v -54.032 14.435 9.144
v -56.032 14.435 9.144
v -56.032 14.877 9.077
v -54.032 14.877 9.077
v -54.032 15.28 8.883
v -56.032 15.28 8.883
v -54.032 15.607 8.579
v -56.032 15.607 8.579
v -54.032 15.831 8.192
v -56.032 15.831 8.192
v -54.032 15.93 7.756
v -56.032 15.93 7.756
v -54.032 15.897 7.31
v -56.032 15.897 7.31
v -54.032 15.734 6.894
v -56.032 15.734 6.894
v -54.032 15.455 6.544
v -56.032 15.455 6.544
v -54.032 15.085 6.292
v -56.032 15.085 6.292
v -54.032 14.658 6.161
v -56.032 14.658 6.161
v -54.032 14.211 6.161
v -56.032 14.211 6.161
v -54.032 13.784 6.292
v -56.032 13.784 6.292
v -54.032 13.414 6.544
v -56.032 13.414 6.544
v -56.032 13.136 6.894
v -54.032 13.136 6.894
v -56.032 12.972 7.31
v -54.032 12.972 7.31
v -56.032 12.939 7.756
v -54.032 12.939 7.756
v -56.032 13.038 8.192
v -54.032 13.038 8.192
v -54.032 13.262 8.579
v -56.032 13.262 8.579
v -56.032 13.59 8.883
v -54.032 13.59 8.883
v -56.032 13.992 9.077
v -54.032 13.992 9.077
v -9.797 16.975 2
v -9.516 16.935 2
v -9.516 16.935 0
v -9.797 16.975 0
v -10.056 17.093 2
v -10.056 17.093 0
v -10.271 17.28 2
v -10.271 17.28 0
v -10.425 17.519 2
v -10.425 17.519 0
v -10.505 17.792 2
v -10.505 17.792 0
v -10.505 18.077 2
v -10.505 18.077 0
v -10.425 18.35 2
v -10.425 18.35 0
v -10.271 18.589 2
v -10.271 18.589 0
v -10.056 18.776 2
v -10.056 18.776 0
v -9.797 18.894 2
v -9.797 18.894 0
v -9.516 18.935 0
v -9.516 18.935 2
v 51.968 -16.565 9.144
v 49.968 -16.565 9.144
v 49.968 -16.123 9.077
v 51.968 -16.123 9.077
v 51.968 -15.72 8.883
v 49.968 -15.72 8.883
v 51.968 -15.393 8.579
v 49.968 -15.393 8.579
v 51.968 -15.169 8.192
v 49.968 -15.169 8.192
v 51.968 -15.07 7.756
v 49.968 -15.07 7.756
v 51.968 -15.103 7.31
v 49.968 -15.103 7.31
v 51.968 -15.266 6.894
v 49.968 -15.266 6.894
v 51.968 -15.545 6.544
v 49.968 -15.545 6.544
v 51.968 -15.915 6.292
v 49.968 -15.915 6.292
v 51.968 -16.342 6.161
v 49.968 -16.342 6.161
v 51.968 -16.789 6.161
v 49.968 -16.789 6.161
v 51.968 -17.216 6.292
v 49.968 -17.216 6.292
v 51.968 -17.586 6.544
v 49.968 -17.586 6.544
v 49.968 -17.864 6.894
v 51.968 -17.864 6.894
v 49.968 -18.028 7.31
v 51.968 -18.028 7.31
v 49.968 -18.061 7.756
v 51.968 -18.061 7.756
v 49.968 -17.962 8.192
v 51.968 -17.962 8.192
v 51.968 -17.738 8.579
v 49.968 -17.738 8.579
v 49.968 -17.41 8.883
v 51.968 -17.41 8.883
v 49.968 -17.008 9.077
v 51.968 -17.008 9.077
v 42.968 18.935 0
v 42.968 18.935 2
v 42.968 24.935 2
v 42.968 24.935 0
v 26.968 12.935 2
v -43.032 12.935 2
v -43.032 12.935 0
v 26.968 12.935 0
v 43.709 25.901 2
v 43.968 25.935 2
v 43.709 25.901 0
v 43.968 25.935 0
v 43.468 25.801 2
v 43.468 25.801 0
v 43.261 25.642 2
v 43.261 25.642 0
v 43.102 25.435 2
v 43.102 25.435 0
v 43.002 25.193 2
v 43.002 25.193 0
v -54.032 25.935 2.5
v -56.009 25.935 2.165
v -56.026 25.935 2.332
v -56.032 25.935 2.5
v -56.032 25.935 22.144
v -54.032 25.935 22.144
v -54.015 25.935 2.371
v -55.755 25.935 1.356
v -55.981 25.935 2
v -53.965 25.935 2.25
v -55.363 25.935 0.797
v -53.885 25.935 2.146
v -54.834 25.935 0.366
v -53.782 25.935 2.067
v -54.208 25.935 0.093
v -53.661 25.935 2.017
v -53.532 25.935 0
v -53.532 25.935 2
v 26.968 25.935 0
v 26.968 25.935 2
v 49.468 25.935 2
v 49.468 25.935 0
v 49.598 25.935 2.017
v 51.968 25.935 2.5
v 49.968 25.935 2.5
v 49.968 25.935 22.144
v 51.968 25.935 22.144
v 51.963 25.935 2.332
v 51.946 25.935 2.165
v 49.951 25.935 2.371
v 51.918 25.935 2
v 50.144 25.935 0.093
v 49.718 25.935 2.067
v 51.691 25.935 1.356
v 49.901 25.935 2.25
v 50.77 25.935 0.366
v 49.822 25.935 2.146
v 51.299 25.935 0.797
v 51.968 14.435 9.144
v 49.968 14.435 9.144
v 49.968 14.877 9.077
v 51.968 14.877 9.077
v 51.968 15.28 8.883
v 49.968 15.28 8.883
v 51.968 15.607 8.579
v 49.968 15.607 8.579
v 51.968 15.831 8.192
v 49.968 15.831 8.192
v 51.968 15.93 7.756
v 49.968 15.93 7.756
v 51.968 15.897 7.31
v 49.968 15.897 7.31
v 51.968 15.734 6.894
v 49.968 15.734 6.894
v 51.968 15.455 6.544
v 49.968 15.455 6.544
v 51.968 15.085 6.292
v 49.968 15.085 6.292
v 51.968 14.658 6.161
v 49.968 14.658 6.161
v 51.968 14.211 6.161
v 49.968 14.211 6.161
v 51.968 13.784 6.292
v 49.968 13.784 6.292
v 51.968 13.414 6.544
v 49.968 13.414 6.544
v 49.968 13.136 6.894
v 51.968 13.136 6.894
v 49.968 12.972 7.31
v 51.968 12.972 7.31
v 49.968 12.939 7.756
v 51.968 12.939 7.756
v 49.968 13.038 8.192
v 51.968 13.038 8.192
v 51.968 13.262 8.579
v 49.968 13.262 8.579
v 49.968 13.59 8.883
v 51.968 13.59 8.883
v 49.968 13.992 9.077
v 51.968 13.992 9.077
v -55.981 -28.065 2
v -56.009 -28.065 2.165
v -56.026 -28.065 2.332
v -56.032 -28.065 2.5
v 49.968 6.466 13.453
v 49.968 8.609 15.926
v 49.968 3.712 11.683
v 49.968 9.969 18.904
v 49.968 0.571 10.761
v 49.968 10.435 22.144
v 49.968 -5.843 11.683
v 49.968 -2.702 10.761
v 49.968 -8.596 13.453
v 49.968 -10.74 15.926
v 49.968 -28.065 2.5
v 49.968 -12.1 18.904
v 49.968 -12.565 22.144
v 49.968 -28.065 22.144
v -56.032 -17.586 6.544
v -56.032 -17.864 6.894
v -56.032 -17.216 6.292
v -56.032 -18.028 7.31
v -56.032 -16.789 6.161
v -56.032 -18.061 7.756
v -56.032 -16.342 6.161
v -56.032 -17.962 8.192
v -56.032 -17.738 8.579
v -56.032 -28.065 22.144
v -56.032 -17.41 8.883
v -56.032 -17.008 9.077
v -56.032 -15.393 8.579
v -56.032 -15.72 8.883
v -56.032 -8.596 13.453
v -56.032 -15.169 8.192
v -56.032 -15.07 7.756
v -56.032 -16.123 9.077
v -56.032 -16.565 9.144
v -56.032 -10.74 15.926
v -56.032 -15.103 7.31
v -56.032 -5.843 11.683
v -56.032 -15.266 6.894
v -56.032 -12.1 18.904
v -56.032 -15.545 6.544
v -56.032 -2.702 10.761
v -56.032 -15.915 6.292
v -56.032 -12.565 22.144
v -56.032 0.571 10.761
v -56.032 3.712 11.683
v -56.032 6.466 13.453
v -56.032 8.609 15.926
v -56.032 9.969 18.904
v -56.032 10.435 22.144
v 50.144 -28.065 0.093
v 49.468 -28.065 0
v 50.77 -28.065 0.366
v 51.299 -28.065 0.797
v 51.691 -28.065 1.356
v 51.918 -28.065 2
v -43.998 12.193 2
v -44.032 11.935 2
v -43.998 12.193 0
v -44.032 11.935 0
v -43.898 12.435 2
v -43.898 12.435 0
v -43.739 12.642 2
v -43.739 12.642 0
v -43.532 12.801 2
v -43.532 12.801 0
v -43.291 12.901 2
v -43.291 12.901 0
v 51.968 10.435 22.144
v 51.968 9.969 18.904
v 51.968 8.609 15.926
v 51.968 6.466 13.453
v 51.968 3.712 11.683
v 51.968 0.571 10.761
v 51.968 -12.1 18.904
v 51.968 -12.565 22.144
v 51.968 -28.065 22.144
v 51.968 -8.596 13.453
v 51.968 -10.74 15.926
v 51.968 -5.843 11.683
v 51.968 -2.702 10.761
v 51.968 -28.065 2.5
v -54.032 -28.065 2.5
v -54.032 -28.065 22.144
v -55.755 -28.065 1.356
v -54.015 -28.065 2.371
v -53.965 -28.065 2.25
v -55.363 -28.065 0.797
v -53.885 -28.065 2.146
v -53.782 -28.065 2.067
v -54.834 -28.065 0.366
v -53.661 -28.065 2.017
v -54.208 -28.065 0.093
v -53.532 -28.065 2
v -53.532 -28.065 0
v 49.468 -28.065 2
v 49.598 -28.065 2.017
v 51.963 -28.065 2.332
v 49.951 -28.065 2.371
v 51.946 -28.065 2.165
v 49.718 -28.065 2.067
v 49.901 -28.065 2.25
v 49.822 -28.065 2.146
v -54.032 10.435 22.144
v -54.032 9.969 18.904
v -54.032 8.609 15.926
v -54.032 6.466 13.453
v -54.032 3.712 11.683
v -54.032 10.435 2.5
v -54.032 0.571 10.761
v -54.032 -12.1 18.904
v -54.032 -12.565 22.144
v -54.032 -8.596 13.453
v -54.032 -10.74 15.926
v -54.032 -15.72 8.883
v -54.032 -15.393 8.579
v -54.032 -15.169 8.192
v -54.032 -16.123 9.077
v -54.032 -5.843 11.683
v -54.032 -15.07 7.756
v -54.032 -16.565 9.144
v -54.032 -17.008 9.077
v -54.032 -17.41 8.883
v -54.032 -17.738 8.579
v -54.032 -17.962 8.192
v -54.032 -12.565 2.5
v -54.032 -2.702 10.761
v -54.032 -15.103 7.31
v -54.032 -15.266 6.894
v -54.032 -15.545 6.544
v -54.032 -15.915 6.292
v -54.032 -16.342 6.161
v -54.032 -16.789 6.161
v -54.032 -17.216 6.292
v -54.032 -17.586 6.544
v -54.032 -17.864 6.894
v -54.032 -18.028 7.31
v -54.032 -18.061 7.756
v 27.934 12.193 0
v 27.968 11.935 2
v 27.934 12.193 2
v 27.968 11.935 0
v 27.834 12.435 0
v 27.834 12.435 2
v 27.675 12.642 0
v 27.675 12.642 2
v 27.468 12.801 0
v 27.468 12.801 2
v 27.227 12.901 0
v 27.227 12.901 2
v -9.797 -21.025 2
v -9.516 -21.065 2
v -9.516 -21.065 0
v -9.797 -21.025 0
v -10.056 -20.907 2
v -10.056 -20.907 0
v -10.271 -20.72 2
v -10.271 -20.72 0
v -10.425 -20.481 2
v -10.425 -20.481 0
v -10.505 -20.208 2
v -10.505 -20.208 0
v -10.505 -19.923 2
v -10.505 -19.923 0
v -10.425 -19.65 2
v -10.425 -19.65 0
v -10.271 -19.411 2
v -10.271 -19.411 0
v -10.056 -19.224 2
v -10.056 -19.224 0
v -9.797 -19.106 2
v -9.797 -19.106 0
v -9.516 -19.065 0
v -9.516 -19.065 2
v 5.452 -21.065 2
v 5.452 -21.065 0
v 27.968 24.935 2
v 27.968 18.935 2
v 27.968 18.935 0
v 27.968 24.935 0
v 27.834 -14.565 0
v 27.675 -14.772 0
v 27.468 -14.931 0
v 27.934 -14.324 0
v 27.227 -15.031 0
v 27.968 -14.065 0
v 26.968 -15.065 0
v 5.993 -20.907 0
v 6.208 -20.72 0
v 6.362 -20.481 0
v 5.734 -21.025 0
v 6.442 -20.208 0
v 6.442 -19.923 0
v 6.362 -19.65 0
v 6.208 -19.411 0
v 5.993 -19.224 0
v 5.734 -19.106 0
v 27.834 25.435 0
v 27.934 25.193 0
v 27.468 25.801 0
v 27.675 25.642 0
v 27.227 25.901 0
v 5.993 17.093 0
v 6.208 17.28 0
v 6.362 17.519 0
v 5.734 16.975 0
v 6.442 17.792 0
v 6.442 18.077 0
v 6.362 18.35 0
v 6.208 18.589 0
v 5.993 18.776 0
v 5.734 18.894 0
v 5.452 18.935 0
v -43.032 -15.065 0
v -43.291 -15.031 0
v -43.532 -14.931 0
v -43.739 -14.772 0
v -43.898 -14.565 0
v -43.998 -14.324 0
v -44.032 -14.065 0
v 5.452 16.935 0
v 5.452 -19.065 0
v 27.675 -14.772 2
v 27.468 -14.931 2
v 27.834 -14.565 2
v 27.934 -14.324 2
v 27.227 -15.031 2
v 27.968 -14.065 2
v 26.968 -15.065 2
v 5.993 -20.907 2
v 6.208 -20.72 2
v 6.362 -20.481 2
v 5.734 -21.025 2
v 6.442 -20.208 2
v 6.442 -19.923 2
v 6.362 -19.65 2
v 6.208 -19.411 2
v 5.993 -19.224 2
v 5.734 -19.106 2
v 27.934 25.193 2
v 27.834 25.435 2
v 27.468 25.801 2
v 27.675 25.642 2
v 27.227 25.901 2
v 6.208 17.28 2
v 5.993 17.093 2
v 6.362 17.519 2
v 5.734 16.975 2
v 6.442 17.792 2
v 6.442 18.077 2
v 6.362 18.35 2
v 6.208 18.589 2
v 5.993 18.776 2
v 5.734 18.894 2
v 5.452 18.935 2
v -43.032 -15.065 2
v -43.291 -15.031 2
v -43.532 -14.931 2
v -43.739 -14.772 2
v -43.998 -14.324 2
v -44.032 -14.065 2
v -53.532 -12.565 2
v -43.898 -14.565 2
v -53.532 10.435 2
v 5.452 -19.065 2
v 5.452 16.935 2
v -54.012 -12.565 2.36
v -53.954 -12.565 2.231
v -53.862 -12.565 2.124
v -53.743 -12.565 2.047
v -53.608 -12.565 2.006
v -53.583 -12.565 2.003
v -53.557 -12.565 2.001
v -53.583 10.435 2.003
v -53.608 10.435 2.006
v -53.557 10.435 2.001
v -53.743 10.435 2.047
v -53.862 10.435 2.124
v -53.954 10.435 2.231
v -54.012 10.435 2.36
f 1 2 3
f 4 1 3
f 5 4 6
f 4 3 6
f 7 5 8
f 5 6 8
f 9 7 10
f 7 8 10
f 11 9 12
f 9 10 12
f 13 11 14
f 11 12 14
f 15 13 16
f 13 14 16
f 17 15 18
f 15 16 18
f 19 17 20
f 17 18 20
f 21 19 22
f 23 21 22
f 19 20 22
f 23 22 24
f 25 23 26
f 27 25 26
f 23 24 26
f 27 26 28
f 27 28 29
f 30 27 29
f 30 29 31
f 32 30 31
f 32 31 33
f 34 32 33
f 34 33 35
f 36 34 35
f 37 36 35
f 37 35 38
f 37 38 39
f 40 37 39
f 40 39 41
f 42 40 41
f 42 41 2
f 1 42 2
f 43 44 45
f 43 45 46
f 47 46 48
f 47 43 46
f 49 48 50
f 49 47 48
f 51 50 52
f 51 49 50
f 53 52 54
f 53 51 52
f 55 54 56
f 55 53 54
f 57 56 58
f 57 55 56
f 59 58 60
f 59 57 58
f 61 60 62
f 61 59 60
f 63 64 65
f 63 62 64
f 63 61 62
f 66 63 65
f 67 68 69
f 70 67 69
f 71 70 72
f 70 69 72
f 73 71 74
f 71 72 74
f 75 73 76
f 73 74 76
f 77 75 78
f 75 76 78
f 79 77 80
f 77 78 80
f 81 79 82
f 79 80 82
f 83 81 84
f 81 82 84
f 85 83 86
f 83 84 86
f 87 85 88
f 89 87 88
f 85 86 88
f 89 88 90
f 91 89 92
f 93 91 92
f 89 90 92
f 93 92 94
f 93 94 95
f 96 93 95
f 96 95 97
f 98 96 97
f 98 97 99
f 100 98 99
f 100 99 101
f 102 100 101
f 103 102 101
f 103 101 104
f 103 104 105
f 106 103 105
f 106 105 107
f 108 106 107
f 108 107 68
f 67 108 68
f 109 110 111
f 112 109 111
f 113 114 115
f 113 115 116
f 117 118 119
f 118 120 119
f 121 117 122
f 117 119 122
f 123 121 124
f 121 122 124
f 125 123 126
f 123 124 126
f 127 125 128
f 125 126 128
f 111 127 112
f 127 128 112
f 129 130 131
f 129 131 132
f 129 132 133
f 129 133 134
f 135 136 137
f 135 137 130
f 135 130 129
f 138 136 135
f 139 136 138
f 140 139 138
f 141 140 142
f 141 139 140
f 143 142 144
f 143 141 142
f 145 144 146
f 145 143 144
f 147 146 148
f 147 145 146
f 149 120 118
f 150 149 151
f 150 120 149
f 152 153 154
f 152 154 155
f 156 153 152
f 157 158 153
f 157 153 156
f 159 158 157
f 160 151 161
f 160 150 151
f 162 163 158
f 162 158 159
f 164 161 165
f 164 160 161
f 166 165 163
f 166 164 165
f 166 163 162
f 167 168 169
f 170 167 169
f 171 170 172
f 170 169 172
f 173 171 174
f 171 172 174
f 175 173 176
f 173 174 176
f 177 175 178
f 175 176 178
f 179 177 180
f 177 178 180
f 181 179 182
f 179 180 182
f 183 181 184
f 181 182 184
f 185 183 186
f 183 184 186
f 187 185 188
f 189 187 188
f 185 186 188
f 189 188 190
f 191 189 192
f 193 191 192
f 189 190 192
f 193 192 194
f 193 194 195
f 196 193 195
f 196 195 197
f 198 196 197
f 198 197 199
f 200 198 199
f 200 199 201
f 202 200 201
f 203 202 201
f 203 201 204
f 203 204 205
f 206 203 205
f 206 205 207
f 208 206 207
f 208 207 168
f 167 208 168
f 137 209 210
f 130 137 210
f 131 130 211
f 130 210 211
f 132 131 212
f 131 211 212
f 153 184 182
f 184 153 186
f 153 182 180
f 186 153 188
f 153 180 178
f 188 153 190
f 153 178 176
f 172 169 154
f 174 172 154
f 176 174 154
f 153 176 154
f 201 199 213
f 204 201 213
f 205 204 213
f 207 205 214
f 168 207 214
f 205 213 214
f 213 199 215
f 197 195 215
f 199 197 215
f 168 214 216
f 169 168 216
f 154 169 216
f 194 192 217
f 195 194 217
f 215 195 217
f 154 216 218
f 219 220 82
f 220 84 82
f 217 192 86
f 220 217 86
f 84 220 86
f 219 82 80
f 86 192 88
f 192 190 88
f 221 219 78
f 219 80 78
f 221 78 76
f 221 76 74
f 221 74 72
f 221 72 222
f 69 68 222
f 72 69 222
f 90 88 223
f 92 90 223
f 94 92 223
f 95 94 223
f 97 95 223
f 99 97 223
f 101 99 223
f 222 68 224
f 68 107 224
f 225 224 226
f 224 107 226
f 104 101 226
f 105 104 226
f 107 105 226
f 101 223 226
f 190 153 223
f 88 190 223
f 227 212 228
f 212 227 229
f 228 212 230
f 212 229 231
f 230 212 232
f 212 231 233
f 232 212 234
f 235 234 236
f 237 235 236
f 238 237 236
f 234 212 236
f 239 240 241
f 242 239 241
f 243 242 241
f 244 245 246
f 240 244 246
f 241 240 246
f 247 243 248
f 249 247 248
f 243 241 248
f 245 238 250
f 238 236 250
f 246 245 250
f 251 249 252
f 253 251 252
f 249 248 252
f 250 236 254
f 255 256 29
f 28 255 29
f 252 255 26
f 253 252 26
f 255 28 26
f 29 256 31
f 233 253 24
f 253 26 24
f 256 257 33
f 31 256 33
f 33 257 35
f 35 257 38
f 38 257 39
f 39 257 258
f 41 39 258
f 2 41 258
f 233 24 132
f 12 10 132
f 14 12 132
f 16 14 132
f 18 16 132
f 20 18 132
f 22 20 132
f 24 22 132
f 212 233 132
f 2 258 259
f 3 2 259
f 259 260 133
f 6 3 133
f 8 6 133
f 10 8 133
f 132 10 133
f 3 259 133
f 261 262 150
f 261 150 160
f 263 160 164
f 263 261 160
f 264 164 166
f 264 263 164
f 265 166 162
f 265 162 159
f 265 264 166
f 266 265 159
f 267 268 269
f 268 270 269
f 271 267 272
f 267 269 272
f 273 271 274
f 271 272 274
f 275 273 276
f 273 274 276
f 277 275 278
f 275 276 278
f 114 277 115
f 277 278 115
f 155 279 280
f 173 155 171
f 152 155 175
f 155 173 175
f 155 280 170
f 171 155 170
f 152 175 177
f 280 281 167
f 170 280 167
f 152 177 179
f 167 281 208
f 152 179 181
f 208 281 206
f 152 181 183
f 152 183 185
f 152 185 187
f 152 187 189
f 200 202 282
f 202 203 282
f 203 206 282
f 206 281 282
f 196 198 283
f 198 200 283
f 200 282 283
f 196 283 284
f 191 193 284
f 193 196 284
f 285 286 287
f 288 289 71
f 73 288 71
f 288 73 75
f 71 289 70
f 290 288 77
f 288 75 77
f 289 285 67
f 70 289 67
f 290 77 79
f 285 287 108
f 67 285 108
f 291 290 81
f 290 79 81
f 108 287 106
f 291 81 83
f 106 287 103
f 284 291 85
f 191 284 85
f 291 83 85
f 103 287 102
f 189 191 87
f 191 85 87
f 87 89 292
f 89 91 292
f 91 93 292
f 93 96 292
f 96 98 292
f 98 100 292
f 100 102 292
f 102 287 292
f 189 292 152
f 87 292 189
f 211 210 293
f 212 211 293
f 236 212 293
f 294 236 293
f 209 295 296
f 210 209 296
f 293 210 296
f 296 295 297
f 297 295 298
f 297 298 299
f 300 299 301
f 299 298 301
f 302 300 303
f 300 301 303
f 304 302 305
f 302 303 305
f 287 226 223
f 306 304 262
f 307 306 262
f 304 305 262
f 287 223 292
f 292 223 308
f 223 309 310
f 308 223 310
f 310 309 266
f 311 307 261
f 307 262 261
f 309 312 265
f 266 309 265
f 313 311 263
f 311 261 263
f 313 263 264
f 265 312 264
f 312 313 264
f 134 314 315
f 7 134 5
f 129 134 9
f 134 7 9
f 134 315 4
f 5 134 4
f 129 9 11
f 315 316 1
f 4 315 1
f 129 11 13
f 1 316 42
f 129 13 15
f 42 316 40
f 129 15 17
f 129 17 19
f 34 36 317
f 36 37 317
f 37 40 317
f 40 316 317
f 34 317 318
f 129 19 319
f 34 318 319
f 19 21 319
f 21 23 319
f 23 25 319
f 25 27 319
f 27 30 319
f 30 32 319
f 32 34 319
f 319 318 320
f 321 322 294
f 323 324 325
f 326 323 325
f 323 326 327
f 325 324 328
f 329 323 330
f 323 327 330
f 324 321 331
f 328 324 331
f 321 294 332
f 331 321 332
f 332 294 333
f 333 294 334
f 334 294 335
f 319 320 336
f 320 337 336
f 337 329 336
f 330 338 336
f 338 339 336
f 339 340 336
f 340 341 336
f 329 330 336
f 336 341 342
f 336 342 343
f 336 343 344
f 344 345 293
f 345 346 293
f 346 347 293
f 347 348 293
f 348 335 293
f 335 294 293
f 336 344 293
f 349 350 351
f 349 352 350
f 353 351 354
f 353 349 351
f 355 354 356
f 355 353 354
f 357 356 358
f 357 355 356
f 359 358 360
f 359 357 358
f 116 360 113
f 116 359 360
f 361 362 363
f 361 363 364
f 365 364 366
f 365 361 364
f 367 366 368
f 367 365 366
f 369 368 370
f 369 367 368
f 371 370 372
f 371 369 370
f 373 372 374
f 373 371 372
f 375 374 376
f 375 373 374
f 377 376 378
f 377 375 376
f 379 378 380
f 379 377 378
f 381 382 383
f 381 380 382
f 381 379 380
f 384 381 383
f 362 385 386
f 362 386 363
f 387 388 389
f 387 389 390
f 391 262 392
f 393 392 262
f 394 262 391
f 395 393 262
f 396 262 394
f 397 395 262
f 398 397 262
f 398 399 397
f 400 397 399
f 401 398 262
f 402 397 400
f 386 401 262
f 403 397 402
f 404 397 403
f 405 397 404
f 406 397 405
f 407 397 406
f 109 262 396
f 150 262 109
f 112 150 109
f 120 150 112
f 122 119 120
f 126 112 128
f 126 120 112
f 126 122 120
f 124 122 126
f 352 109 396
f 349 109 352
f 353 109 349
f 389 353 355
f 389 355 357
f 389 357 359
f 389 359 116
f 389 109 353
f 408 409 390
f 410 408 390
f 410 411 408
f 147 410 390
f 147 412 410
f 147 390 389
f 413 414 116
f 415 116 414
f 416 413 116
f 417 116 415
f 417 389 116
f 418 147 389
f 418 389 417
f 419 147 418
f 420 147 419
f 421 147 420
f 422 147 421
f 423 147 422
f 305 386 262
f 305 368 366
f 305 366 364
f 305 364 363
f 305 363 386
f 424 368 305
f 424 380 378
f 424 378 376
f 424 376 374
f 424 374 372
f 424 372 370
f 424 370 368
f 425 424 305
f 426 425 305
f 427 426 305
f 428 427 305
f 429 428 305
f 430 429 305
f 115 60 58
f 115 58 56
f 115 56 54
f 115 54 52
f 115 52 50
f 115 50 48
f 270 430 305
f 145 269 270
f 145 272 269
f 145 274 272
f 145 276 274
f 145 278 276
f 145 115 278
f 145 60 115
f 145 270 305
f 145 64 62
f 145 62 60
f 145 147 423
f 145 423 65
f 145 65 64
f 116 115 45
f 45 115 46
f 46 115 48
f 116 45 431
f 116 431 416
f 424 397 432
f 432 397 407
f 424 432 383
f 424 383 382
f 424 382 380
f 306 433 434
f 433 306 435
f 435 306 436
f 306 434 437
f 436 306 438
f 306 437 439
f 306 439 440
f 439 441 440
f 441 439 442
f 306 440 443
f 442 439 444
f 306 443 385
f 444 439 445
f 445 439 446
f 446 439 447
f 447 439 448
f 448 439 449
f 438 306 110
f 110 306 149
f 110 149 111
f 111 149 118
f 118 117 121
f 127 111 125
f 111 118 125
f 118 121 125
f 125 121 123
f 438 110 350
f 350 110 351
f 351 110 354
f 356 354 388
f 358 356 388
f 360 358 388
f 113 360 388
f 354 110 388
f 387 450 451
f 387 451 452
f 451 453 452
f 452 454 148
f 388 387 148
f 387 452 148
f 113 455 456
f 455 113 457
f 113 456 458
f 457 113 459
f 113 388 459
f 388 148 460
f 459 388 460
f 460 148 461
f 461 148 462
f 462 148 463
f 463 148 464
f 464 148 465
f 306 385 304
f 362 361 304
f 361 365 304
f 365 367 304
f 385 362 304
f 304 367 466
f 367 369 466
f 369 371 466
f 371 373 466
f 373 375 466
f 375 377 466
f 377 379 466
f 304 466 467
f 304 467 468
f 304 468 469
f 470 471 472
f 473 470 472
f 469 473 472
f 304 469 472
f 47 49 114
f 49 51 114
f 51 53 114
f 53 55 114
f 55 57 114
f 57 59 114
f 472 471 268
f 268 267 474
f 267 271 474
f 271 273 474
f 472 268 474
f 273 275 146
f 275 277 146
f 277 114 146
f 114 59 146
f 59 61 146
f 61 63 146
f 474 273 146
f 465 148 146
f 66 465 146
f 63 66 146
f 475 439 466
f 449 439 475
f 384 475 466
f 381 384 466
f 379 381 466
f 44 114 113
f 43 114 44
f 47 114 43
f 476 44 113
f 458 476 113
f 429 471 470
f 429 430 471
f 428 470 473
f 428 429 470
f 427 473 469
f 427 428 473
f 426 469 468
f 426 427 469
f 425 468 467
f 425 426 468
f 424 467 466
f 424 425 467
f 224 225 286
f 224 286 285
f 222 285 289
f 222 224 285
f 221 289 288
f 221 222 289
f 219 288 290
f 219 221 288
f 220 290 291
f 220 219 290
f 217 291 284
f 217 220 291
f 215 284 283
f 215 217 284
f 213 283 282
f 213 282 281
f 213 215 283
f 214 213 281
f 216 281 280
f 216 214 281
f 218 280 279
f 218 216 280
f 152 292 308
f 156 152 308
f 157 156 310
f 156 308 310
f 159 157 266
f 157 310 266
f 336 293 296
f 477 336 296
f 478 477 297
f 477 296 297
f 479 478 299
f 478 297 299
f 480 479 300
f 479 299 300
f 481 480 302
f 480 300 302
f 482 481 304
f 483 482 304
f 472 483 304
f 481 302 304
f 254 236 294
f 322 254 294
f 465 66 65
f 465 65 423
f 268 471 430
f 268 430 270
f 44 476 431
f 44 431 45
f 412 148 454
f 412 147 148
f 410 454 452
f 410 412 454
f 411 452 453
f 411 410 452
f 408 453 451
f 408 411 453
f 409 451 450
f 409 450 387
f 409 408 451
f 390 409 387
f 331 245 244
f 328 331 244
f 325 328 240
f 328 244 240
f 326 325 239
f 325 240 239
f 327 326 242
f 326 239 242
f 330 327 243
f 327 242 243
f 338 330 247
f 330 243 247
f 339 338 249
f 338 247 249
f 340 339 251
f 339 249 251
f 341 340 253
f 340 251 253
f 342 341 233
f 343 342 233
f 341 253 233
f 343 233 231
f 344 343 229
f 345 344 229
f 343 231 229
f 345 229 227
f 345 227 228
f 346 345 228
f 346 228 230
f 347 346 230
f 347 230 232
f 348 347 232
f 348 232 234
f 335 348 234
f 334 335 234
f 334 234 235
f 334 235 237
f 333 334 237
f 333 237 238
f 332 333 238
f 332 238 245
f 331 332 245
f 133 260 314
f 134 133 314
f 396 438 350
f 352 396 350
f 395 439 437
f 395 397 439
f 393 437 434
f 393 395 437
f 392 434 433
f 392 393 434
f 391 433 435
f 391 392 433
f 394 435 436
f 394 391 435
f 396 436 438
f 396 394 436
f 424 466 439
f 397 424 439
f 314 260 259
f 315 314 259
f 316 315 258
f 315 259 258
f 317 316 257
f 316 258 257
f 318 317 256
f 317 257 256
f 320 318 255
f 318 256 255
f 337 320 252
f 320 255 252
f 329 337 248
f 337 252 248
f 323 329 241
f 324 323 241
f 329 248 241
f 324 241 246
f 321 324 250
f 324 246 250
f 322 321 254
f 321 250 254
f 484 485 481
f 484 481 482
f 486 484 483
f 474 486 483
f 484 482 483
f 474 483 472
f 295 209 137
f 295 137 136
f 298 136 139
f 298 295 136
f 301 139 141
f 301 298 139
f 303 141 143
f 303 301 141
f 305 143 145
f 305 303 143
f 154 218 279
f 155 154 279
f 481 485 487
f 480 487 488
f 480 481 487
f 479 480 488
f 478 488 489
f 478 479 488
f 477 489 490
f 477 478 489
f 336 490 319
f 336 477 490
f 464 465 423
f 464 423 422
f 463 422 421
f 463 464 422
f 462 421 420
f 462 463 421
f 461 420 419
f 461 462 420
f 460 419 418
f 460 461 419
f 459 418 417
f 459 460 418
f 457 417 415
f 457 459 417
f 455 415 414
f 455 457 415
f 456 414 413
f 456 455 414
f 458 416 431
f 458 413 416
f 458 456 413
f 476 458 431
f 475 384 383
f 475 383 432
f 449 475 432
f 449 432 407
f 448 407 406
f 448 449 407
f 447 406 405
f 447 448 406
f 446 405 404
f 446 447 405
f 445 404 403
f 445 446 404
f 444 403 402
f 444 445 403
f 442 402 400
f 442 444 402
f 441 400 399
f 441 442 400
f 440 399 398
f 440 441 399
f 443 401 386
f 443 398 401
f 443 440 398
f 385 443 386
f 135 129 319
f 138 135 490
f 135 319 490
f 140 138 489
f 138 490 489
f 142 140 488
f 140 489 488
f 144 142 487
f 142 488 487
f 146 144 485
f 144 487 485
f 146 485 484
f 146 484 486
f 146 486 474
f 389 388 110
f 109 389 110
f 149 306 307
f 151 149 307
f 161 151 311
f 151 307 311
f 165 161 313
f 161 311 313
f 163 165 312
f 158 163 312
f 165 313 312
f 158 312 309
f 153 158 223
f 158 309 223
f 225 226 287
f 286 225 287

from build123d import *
from build123d.topology import SkipClean

# Parameters (mm, degrees)
DODANIE_WYCI_GNI_CIE1_DEPTH = 2
SZKIC_START                 = -28.065385
SZKIC_ZGI_CIA1_DEPTH        = 54
SZKIC_ZGI_CIA1_2_DEPTH      = 15.5
SZKIC_START_2               = 10.434615
SZKIC_ZGI_CIA1_3_DEPTH      = 15.5
SZKIC_START_3               = -56.031828
SZKIC_ZGI_CIA1_4_DEPTH      = 2.423909
SZKIC_START_4               = -12.565385
SZKIC_ZGI_CIA1_5_DEPTH      = 23
SZKIC_ZGI_CIA1_6_DEPTH      = 23
SZKIC_ZGI_CIA2_DEPTH        = 54
SZKIC_ZGI_CIA2_2_DEPTH      = 54
SZKIC_START_5               = 49.968172
SZKIC_ZGI_CIA2_3_DEPTH      = 2
SZKIC9_W                    = 72
SZKIC9_H                    = 28
SZKIC9_W_2                  = 15
SZKIC9_H_2                  = 7
WYTNIJ_WYCI_GNI_CIE1_DEPTH  = 66.825561
SZKIC10_R                   = 1.5
WYTNIJ_WYCI_GNI_CIE2_DEPTH  = 114.762973
ZAOKR_GLENIE2_R             = 1
ZAOKR_GLENIE3_R             = 1


with BuildPart() as part:
    # Szkic1 → Dodanie-wyciągnięcie1 (new body)
    with BuildSketch(Plane.XY):
        with BuildLine():
            Line((-75.531828, 25.934615), (71.468172, 25.934615))
            Line((71.468172, 25.934615), (71.468172, 10.434615))
            ThreePointArc((71.468172, 10.434615), (59.968172, -1.065385), (71.468172, -12.565385))
            Line((71.468172, -12.565385), (71.468172, -28.065385))
            Line((71.468172, -28.065385), (-75.531828, -28.065385))
            Line((-75.531828, -28.065385), (-75.531828, -12.565385))
            ThreePointArc((-75.531828, -12.565385), (-64.031828, -1.065385), (-75.531828, 10.434615))
            Line((-75.531828, 10.434615), (-75.531828, 25.934615))
        make_face()
    extrude(amount=DODANIE_WYCI_GNI_CIE1_DEPTH)

    # Szkic zgięcia1: read off the stored shape, not the designer's step
    # Szkic zgięcia1 outline → Szkic zgięcia1 (cut)
    with BuildSketch(Plane(origin=(0, 0, 0), x_dir=(1, 0, 0), z_dir=(0, 1, 0)).offset(SZKIC_START)):
        with BuildLine():
            Line((-75.531828, -2), (-55.981318, -2))
            ThreePointArc((-55.981318, -2), (-55.112967, -0.563508), (-53.531828, 0))
            Line((-53.531828, 0), (-75.531828, 0))
            Line((-75.531828, 0), (-75.531828, -2))
        make_face()
    extrude(amount=SZKIC_ZGI_CIA1_DEPTH, mode=Mode.SUBTRACT)

    # Szkic zgi_cia1 2 outline → Szkic zgi_cia1 2 (add)
    with BuildSketch(Plane(origin=(0, 0, 0), x_dir=(1, 0, 0), z_dir=(0, 1, 0)).offset(SZKIC_START)):
        with BuildLine():
            ThreePointArc((-55.981318, -2), (-56.019168, -2.248728), (-56.031828, -2.5))
            Line((-56.031828, -2.5), (-56.031828, -22.143806))
            Line((-56.031828, -22.143806), (-54.031828, -22.143806))
            Line((-54.031828, -22.143806), (-54.031828, -2.5))
            ThreePointArc((-54.031828, -2.5), (-53.885381, -2.146447), (-53.531828, -2))
            Line((-53.531828, -2), (-55.981318, -2))
        make_face()
    extrude(amount=SZKIC_ZGI_CIA1_2_DEPTH)

    # Szkic zgi_cia1 3 outline → Szkic zgi_cia1 3 (add)
    with BuildSketch(Plane(origin=(0, 0, 0), x_dir=(1, 0, 0), z_dir=(0, 1, 0)).offset(SZKIC_START_2)):
        with BuildLine():
            ThreePointArc((-55.981318, -2), (-56.019168, -2.248728), (-56.031828, -2.5))
            Line((-56.031828, -2.5), (-56.031828, -22.143806))
            Line((-56.031828, -22.143806), (-54.031828, -22.143806))
            Line((-54.031828, -22.143806), (-54.031828, -2.5))
            ThreePointArc((-54.031828, -2.5), (-53.885381, -2.146447), (-53.531828, -2))
            Line((-53.531828, -2), (-55.981318, -2))
        make_face()
    extrude(amount=SZKIC_ZGI_CIA1_3_DEPTH)

    # Szkic zgi_cia1 4 outline → Szkic zgi_cia1 4 (add)
    with BuildSketch(Plane.YZ.offset(SZKIC_START_3)):
        with BuildLine():
            Line((10.434615, 2), (10.434615, 22.143806))
            ThreePointArc((10.434615, 22.143806), (-1.065385, 10.643806), (-12.565385, 22.143806))
            Line((-12.565385, 22.143806), (-12.565385, 2))
            Line((-12.565385, 2), (10.434615, 2))
        make_face()
    extrude(amount=SZKIC_ZGI_CIA1_4_DEPTH)

    # Szkic zgi_cia1 5 outline → Szkic zgi_cia1 5 (cut)
    with SkipClean():  # the faces are left unmerged after this step: merging them gives an invalid solid
        with BuildSketch(Plane(origin=(0, 0, 0), x_dir=(1, 0, 0), z_dir=(0, 1, 0)).offset(SZKIC_START_4)):
            with BuildLine():
                ThreePointArc((-53.607919, -2.005824), (-53.911331, -2.174459), (-54.031828, -2.5))
                Line((-54.031828, -2.5), (-54.031828, -24))
                Line((-54.031828, -24), (-53.607919, -24))
                Line((-53.607919, -24), (-53.607919, -2.005824))
            make_face()
            with BuildLine():
                Line((-58, -24), (-56.031828, -24))
                Line((-56.031828, -24), (-56.031828, -2.5))
                ThreePointArc((-56.031828, -2.5), (-56.019168, -2.248728), (-55.981318, -2))
                Line((-55.981318, -2), (-58, -2))
                Line((-58, -2), (-58, -24))
            make_face()
        extrude(amount=SZKIC_ZGI_CIA1_5_DEPTH, mode=Mode.SUBTRACT)

    # Szkic zgi_cia1 6 outline → Szkic zgi_cia1 6 (add)
    with SkipClean():  # the faces are left unmerged after this step: merging them gives an invalid solid
        with BuildSketch(Plane(origin=(0, 0, 0), x_dir=(1, 0, 0), z_dir=(0, 1, 0)).offset(SZKIC_START_4)):
            with BuildLine():
                Line((-53.607919, -2), (-53.607919, -2.005824))
                ThreePointArc((-53.607919, -2.005824), (-53.569985, -2.001458), (-53.531828, -2))
                Line((-53.531828, -2), (-53.607919, -2))
            make_face()
        extrude(amount=SZKIC_ZGI_CIA1_6_DEPTH)

    # Szkic zgięcia2: read off the stored shape, not the designer's step
    # Szkic zgięcia2 outline → Szkic zgięcia2 (cut)
    with SkipClean():  # the faces are left unmerged after this step: merging them gives an invalid solid
        with BuildSketch(Plane(origin=(0, 0, 0), x_dir=(1, 0, 0), z_dir=(0, 1, 0)).offset(SZKIC_START)):
            with BuildLine():
                ThreePointArc((49.468172, 0), (51.049311, -0.563508), (51.917662, -2))
                Line((51.917662, -2), (71.468172, -2))
                Line((71.468172, -2), (71.468172, 0))
                Line((71.468172, 0), (49.468172, 0))
            make_face()
        extrude(amount=SZKIC_ZGI_CIA2_DEPTH, mode=Mode.SUBTRACT)

    # Szkic zgi_cia2 2 outline → Szkic zgi_cia2 2 (add)
    with SkipClean():  # the faces are left unmerged after this step: merging them gives an invalid solid
        with BuildSketch(Plane(origin=(0, 0, 0), x_dir=(1, 0, 0), z_dir=(0, 1, 0)).offset(SZKIC_START)):
            with BuildLine():
                Line((49.968172, -22.143806), (51.968172, -22.143806))
                Line((51.968172, -22.143806), (51.968172, -2.5))
                ThreePointArc((51.968172, -2.5), (51.955512, -2.248728), (51.917662, -2))
                Line((51.917662, -2), (49.468172, -2))
                ThreePointArc((49.468172, -2), (49.821725, -2.146447), (49.968172, -2.5))
                Line((49.968172, -2.5), (49.968172, -22.143806))
            make_face()
        extrude(amount=SZKIC_ZGI_CIA2_2_DEPTH)

    # Szkic zgi_cia2 3 outline → Szkic zgi_cia2 3 (cut)
    with SkipClean():  # the faces are left unmerged after this step: merging them gives an invalid solid
        with BuildSketch(Plane.YZ.offset(SZKIC_START_5)):
            with BuildLine():
                Line((10.434615, 22.143806), (-12.565385, 22.143806))
                ThreePointArc((-12.565385, 22.143806), (-1.065385, 10.643806), (10.434615, 22.143806))
            make_face()
        extrude(amount=SZKIC_ZGI_CIA2_3_DEPTH, mode=Mode.SUBTRACT)

    # Szkic9 → Wytnij-wyciągnięcie1 (cut, through all)
    with SkipClean():  # the faces are left unmerged after this step: merging them gives an invalid solid
        with BuildSketch(Plane.XY.offset(2)):
            with Locations((-8.031828, -1.065385)):
                Rectangle(SZKIC9_W, SZKIC9_H)
            with Locations((35.468172, 22.434615)):
                Rectangle(SZKIC9_W_2, SZKIC9_H_2)
            with BuildLine():
                Line((-9.515655, 18.934615), (5.451999, 18.934615))
                ThreePointArc((5.451999, 18.934615), (6.451999, 17.934615), (5.451999, 16.934615))
                Line((5.451999, 16.934615), (-9.515655, 16.934615))
                ThreePointArc((-9.515655, 16.934615), (-10.515655, 17.934615), (-9.515655, 18.934615))
            make_face()
            with BuildLine():
                Line((-9.515655, -19.065385), (5.451999, -19.065385))
                ThreePointArc((5.451999, -19.065385), (6.451999, -20.065385), (5.451999, -21.065385))
                Line((5.451999, -21.065385), (-9.515655, -21.065385))
                ThreePointArc((-9.515655, -21.065385), (-10.515655, -20.065385), (-9.515655, -19.065385))
            make_face()
        extrude(amount=-WYTNIJ_WYCI_GNI_CIE1_DEPTH, mode=Mode.SUBTRACT)

    # Szkic10 → Wytnij-wyciągnięcie2 (cut, through all)
    with SkipClean():  # the faces are left unmerged after this step: merging them gives an invalid solid
        with BuildSketch(Plane.ZY.offset(56.031828)):
            with Locations((7.643806, 14.434615)):
                Circle(SZKIC10_R)
            with Locations((7.643806, -16.565385)):
                Circle(SZKIC10_R)
        extrude(amount=-WYTNIJ_WYCI_GNI_CIE2_DEPTH, mode=Mode.SUBTRACT)

    # Zaokrąglenie2
    zaokr_glenie2_edges = [part.edges().sort_by_distance(p)[0] for p in [
        (27.968172, 25.934615, 1),
        (42.968172, 25.934615, 1),
    ]]
    fillet(zaokr_glenie2_edges, radius=ZAOKR_GLENIE2_R)

    # Zaokrąglenie3
    zaokr_glenie3_edges = [part.edges().sort_by_distance(p)[0] for p in [
        (-44.031828, -15.065385, 1),
        (-44.031828, 12.934615, 1),
        (27.968172, 12.934615, 1),
        (27.968172, -15.065385, 1),
    ]]
    fillet(zaokr_glenie3_edges, radius=ZAOKR_GLENIE3_R)


solid = part.part
